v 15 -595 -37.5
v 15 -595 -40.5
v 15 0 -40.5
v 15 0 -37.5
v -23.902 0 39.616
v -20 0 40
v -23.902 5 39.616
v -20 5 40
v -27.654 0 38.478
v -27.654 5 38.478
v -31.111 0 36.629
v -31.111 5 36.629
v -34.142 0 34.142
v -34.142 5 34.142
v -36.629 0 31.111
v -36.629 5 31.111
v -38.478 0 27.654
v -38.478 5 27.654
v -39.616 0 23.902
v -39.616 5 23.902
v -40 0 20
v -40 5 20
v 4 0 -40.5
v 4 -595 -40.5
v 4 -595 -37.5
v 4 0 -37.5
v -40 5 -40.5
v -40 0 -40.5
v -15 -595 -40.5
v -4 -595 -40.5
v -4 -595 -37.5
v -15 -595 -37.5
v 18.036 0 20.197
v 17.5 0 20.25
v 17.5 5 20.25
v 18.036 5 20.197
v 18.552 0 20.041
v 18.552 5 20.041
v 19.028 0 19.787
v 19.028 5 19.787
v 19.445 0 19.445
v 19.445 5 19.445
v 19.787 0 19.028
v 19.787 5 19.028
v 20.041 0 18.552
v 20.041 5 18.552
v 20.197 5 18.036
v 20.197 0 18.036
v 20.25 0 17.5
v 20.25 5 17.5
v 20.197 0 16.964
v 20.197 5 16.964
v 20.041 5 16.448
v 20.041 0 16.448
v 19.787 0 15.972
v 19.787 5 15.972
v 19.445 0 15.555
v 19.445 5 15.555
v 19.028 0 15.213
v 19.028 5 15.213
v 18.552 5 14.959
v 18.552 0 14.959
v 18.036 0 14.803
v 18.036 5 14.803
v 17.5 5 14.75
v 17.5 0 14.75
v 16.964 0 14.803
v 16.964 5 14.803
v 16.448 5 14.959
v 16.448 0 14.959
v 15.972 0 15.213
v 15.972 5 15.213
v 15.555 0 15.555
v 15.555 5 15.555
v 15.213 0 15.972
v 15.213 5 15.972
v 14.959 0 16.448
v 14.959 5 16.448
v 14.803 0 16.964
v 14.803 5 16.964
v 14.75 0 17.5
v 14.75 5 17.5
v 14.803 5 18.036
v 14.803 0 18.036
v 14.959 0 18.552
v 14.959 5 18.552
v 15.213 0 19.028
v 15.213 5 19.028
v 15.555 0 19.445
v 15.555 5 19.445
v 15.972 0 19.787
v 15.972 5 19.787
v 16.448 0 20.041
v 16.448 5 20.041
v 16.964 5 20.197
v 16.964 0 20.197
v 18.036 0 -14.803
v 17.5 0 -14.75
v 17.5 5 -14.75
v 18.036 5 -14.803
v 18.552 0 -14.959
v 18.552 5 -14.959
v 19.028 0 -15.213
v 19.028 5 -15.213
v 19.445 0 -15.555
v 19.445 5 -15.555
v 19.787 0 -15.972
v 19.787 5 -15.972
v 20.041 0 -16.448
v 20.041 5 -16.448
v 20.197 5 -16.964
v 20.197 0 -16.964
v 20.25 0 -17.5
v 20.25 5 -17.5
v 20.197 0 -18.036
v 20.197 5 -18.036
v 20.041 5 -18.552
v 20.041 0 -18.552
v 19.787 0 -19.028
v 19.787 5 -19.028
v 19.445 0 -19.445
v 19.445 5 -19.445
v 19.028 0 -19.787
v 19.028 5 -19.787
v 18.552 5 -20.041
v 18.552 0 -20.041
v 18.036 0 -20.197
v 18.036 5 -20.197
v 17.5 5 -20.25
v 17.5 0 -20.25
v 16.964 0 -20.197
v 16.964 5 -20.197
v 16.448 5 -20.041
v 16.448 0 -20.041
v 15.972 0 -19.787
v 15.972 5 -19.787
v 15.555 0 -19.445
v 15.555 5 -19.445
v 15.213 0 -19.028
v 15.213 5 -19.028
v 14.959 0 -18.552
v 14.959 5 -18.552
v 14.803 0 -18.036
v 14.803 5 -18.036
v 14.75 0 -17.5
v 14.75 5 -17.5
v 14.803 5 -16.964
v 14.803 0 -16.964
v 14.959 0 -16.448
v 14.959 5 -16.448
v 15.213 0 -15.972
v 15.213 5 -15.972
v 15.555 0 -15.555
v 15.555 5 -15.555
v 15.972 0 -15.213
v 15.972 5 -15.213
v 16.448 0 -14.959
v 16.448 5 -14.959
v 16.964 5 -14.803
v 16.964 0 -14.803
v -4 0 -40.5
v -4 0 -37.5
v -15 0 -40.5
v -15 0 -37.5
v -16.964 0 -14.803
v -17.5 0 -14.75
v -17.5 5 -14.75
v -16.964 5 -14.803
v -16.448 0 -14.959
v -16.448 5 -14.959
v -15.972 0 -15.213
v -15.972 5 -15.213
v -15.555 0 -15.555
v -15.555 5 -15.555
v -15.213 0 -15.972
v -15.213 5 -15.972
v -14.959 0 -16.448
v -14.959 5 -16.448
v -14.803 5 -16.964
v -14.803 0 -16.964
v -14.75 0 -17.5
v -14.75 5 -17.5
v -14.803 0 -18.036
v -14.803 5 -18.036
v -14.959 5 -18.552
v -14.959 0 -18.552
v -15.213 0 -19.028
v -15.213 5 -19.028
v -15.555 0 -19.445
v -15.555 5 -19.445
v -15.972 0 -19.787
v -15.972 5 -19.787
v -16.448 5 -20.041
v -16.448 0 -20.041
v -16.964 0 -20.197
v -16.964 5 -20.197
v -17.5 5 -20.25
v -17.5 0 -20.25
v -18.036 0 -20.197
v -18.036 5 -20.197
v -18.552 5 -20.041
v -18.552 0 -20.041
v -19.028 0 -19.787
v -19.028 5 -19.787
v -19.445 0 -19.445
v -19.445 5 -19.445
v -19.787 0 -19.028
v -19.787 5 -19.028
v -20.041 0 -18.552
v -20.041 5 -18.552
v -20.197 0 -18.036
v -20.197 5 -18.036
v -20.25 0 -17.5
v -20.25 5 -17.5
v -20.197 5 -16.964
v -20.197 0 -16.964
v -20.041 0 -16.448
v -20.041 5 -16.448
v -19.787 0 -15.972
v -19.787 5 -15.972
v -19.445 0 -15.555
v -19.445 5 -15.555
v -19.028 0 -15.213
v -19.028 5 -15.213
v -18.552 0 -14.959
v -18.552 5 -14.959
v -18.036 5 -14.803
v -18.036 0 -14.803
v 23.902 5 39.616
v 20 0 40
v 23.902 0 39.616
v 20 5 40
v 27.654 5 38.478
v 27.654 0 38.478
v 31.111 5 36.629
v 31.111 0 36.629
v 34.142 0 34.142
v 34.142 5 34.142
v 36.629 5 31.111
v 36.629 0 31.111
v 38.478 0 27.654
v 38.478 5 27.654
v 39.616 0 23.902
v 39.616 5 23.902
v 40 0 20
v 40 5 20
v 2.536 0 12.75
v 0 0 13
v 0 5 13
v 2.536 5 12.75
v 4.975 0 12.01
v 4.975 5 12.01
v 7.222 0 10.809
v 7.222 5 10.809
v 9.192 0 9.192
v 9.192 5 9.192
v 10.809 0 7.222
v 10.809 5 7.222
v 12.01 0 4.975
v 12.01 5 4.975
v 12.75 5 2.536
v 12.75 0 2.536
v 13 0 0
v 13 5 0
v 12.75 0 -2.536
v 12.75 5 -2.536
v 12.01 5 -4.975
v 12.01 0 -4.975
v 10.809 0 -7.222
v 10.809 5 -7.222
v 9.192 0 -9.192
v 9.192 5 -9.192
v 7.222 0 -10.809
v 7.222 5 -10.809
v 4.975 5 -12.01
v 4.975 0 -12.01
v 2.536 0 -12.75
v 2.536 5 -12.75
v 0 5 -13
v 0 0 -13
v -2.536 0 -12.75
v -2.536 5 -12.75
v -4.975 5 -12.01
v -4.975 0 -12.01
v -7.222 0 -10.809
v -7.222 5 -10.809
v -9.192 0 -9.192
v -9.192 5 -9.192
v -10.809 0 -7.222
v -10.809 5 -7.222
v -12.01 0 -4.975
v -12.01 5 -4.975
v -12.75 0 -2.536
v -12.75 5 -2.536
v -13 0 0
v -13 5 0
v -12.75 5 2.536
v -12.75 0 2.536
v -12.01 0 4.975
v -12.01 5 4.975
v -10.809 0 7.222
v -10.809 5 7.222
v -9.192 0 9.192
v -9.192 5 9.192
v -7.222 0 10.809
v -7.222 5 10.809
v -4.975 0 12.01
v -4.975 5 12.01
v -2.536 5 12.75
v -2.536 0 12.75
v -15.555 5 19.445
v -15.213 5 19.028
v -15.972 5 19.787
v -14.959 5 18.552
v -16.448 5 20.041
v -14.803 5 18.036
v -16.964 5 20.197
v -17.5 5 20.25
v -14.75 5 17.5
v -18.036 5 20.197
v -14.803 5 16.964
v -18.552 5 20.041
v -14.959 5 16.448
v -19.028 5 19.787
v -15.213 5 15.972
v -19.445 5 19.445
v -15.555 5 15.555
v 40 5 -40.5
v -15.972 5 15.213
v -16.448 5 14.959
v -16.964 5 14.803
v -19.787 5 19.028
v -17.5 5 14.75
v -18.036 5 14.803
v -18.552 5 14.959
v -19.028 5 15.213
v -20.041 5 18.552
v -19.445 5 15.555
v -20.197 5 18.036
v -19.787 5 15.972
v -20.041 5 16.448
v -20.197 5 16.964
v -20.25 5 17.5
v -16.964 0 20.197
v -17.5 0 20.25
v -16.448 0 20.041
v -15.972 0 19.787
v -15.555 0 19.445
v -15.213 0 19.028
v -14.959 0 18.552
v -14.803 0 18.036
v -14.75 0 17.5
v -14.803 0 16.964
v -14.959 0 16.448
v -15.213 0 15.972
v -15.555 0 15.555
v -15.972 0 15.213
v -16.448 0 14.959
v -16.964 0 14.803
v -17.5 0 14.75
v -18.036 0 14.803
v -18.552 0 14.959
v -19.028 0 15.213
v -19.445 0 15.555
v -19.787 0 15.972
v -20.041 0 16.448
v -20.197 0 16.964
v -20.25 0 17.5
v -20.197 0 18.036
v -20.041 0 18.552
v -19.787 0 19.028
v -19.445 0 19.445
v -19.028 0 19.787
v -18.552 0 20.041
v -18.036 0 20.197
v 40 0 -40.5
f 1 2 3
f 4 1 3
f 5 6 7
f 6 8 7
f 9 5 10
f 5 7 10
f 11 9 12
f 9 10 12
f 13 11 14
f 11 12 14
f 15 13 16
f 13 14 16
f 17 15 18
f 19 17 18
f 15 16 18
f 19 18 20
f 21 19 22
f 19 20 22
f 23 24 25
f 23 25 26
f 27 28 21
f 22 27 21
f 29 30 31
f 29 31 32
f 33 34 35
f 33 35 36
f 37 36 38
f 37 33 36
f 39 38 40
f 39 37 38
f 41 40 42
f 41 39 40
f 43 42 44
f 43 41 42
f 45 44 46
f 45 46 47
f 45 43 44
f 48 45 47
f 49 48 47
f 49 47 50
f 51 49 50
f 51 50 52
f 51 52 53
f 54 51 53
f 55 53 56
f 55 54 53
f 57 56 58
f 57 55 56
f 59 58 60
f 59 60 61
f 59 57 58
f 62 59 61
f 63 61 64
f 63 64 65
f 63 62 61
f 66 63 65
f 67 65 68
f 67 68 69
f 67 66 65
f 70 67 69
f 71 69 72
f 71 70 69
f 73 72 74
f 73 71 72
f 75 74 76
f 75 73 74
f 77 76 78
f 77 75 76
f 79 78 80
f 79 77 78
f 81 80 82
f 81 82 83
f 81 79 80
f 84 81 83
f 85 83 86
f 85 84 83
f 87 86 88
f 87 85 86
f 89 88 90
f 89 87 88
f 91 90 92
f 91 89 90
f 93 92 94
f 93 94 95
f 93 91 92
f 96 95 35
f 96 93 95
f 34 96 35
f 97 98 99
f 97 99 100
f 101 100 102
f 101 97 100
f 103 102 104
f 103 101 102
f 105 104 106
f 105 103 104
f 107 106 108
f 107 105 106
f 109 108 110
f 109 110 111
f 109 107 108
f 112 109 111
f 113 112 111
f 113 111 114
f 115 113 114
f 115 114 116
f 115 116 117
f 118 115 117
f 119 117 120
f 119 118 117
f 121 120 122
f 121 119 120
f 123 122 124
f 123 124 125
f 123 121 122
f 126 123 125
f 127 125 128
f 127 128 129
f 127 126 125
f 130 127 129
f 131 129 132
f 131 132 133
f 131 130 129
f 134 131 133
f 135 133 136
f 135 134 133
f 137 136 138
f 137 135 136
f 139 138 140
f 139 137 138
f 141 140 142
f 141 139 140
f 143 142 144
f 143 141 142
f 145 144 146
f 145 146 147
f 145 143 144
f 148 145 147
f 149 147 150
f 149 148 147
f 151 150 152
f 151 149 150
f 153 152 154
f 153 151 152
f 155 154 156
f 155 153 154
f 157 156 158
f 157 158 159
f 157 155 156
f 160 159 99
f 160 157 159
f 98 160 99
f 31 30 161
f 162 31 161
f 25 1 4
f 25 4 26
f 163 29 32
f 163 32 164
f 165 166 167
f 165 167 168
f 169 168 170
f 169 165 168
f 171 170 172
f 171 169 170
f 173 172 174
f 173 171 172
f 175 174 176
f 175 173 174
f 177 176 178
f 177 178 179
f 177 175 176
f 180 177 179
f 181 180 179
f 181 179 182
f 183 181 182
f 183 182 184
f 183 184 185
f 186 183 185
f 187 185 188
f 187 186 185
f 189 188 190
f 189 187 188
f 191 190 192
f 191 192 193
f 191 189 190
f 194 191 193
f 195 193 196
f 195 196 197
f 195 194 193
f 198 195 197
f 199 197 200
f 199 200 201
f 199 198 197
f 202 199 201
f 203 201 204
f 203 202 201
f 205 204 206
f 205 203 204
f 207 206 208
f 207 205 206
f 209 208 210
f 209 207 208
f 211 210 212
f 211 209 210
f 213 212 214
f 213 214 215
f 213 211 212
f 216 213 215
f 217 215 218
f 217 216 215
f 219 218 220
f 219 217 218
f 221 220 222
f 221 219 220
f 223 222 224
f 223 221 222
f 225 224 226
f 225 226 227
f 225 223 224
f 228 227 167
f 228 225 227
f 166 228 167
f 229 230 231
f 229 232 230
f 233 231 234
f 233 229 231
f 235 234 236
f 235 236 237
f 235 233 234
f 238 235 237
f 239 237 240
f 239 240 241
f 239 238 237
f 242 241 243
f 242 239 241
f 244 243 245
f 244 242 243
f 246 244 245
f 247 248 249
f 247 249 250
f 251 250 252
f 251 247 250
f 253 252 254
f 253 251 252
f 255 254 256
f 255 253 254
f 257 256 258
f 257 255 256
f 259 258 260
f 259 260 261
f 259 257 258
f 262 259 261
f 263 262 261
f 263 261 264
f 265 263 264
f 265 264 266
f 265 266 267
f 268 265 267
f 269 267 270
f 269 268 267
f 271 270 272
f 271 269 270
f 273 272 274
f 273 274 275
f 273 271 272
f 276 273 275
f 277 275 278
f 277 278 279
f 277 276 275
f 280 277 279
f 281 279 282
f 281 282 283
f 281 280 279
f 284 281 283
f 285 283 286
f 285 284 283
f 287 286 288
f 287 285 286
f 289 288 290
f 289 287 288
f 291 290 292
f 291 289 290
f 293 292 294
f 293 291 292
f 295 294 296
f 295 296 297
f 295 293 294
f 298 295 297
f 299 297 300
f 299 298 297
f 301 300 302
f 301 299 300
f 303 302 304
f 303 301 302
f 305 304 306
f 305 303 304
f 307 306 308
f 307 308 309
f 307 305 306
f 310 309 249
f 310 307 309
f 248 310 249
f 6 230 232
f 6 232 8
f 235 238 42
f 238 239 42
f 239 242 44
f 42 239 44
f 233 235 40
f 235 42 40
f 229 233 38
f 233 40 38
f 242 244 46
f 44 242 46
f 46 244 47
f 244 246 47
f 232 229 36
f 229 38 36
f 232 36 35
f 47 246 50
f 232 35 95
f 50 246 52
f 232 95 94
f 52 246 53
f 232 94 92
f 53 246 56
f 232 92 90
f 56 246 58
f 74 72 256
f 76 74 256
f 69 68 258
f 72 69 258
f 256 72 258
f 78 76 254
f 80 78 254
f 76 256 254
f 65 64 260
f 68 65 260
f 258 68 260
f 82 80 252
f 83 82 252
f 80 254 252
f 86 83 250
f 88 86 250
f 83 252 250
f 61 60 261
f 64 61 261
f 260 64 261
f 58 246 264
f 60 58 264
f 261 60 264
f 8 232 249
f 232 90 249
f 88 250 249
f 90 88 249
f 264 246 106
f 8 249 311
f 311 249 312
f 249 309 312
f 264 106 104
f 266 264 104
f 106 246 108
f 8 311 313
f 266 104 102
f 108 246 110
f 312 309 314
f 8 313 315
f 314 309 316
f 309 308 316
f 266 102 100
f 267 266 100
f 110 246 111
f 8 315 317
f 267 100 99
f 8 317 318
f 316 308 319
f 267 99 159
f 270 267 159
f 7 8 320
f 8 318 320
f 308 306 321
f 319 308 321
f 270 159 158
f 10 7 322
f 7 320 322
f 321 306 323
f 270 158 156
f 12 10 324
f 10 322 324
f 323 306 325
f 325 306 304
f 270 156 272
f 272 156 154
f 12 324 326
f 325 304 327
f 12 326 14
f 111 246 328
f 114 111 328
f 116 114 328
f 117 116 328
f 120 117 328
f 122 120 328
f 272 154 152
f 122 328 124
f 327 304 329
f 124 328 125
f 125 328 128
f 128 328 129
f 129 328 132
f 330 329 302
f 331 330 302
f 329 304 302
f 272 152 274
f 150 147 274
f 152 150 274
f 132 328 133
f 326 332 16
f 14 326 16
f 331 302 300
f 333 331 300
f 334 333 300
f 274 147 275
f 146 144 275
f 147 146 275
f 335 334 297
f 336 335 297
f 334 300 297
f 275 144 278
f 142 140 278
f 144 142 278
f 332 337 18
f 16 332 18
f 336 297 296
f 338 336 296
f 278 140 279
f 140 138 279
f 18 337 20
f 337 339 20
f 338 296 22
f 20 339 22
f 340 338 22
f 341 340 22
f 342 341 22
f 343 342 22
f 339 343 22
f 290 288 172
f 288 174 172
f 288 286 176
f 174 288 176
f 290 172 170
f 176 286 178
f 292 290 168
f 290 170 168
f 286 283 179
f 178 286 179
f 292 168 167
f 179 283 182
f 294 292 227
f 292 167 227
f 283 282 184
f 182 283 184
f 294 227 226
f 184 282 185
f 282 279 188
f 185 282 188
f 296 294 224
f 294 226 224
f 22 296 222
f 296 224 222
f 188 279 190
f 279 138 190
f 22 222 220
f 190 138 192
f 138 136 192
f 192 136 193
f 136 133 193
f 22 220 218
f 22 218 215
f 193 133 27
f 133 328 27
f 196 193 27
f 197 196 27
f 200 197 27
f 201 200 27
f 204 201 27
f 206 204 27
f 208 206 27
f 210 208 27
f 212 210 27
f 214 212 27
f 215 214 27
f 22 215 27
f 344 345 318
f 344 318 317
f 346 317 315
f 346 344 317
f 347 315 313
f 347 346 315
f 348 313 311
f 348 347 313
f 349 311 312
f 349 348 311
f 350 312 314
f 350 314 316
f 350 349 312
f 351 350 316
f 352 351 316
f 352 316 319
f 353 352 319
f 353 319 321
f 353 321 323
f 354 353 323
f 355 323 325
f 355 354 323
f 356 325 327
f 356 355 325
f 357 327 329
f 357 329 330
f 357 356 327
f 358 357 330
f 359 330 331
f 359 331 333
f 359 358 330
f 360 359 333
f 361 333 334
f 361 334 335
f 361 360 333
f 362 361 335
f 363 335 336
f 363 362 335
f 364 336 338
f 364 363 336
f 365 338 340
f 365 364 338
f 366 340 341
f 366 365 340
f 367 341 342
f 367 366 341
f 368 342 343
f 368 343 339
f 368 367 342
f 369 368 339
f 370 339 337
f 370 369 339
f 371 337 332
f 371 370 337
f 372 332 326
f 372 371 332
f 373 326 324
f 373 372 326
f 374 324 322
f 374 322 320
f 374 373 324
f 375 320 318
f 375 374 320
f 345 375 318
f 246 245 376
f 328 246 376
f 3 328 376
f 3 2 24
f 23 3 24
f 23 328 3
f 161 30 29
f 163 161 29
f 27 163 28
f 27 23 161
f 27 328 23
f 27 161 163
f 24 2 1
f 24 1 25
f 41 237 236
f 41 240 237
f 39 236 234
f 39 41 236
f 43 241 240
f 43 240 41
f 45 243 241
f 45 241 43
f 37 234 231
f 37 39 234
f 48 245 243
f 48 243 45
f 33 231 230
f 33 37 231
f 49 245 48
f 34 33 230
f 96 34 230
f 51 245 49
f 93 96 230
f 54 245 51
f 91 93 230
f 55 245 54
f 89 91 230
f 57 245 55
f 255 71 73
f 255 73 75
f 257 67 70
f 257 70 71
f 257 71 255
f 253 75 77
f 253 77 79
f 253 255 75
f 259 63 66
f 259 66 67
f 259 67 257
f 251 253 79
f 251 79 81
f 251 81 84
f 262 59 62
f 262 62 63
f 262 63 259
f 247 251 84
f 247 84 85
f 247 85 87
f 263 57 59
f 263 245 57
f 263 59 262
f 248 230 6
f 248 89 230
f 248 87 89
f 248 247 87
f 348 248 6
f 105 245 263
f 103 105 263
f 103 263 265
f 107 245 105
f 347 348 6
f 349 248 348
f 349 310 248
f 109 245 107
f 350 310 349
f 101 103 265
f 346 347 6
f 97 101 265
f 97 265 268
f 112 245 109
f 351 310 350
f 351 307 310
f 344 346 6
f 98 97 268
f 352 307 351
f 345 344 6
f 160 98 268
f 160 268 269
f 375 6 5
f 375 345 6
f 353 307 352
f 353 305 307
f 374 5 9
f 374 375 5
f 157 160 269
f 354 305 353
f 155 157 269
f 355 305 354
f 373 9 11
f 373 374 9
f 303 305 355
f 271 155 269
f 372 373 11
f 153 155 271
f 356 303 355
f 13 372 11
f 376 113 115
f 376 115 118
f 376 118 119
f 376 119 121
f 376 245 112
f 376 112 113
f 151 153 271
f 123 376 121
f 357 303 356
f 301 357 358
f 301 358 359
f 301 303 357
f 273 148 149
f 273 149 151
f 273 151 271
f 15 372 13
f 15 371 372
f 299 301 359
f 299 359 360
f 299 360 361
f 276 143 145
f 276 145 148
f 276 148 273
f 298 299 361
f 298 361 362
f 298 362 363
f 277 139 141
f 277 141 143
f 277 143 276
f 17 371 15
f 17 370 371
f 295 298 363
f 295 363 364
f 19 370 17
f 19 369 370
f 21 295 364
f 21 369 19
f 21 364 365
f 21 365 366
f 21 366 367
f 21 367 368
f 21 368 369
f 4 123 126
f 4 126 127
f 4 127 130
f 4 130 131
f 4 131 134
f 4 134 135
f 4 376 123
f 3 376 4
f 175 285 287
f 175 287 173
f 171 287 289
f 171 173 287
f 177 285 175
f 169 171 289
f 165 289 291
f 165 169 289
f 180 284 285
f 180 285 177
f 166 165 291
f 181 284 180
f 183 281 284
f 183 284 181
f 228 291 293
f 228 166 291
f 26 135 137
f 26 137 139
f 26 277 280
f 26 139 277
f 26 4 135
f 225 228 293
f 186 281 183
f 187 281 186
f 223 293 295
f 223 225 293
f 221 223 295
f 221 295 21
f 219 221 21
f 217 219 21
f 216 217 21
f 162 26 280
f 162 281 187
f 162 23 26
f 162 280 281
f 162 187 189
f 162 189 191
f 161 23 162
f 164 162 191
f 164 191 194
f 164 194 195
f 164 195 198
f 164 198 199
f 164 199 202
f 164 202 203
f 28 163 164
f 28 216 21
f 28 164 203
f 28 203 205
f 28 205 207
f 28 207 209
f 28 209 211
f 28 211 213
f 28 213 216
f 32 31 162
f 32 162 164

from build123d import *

# Parameters (mm, degrees)
SKETCH1_R           = 13
SKETCH1_R_2         = 2.75
BOSS_EXTRUDE1_DEPTH = 5
SKETCH2_W           = 11
SKETCH2_H           = 600
BOSS_EXTRUDE2_DEPTH = 3
FILLET1_R           = 20


with BuildPart() as part:
    # Sketch1 → Boss-Extrude1 (new body)
    with BuildSketch(Plane(origin=(0, 0, 0), x_dir=(1, 0, 0), z_dir=(0, 1, 0))):
        Polygon((40, -40), (-40, -40), (-40, 40), (-40, 40.5), (40, 40.5), (40, 40), align=None)
        Circle(SKETCH1_R, mode=Mode.SUBTRACT)
        with Locations((-17.5, -17.5)):
            Circle(SKETCH1_R_2, mode=Mode.SUBTRACT)
        with Locations((17.5, -17.5)):
            Circle(SKETCH1_R_2, mode=Mode.SUBTRACT)
        with Locations((17.5, 17.5)):
            Circle(SKETCH1_R_2, mode=Mode.SUBTRACT)
        with Locations((-17.5, 17.5)):
            Circle(SKETCH1_R_2, mode=Mode.SUBTRACT)
    extrude(amount=BOSS_EXTRUDE1_DEPTH)

    # Sketch2 → Boss-Extrude2 (add)
    with BuildSketch(Plane(origin=(0, 0, -40.5), x_dir=(-1, 0, 0), z_dir=(0, 0, -1))):
        with Locations((9.5, -295)):
            Rectangle(SKETCH2_W, SKETCH2_H)
        with Locations((-9.5, -295)):
            Rectangle(SKETCH2_W, SKETCH2_H)
    extrude(amount=-BOSS_EXTRUDE2_DEPTH)

    # Fillet1
    fillet1_edges = [part.edges().sort_by_distance(p)[0] for p in [
        (40, 2.5, 40),
        (-40, 2.5, 40),
    ]]
    fillet(fillet1_edges, radius=FILLET1_R)


solid = part.part
